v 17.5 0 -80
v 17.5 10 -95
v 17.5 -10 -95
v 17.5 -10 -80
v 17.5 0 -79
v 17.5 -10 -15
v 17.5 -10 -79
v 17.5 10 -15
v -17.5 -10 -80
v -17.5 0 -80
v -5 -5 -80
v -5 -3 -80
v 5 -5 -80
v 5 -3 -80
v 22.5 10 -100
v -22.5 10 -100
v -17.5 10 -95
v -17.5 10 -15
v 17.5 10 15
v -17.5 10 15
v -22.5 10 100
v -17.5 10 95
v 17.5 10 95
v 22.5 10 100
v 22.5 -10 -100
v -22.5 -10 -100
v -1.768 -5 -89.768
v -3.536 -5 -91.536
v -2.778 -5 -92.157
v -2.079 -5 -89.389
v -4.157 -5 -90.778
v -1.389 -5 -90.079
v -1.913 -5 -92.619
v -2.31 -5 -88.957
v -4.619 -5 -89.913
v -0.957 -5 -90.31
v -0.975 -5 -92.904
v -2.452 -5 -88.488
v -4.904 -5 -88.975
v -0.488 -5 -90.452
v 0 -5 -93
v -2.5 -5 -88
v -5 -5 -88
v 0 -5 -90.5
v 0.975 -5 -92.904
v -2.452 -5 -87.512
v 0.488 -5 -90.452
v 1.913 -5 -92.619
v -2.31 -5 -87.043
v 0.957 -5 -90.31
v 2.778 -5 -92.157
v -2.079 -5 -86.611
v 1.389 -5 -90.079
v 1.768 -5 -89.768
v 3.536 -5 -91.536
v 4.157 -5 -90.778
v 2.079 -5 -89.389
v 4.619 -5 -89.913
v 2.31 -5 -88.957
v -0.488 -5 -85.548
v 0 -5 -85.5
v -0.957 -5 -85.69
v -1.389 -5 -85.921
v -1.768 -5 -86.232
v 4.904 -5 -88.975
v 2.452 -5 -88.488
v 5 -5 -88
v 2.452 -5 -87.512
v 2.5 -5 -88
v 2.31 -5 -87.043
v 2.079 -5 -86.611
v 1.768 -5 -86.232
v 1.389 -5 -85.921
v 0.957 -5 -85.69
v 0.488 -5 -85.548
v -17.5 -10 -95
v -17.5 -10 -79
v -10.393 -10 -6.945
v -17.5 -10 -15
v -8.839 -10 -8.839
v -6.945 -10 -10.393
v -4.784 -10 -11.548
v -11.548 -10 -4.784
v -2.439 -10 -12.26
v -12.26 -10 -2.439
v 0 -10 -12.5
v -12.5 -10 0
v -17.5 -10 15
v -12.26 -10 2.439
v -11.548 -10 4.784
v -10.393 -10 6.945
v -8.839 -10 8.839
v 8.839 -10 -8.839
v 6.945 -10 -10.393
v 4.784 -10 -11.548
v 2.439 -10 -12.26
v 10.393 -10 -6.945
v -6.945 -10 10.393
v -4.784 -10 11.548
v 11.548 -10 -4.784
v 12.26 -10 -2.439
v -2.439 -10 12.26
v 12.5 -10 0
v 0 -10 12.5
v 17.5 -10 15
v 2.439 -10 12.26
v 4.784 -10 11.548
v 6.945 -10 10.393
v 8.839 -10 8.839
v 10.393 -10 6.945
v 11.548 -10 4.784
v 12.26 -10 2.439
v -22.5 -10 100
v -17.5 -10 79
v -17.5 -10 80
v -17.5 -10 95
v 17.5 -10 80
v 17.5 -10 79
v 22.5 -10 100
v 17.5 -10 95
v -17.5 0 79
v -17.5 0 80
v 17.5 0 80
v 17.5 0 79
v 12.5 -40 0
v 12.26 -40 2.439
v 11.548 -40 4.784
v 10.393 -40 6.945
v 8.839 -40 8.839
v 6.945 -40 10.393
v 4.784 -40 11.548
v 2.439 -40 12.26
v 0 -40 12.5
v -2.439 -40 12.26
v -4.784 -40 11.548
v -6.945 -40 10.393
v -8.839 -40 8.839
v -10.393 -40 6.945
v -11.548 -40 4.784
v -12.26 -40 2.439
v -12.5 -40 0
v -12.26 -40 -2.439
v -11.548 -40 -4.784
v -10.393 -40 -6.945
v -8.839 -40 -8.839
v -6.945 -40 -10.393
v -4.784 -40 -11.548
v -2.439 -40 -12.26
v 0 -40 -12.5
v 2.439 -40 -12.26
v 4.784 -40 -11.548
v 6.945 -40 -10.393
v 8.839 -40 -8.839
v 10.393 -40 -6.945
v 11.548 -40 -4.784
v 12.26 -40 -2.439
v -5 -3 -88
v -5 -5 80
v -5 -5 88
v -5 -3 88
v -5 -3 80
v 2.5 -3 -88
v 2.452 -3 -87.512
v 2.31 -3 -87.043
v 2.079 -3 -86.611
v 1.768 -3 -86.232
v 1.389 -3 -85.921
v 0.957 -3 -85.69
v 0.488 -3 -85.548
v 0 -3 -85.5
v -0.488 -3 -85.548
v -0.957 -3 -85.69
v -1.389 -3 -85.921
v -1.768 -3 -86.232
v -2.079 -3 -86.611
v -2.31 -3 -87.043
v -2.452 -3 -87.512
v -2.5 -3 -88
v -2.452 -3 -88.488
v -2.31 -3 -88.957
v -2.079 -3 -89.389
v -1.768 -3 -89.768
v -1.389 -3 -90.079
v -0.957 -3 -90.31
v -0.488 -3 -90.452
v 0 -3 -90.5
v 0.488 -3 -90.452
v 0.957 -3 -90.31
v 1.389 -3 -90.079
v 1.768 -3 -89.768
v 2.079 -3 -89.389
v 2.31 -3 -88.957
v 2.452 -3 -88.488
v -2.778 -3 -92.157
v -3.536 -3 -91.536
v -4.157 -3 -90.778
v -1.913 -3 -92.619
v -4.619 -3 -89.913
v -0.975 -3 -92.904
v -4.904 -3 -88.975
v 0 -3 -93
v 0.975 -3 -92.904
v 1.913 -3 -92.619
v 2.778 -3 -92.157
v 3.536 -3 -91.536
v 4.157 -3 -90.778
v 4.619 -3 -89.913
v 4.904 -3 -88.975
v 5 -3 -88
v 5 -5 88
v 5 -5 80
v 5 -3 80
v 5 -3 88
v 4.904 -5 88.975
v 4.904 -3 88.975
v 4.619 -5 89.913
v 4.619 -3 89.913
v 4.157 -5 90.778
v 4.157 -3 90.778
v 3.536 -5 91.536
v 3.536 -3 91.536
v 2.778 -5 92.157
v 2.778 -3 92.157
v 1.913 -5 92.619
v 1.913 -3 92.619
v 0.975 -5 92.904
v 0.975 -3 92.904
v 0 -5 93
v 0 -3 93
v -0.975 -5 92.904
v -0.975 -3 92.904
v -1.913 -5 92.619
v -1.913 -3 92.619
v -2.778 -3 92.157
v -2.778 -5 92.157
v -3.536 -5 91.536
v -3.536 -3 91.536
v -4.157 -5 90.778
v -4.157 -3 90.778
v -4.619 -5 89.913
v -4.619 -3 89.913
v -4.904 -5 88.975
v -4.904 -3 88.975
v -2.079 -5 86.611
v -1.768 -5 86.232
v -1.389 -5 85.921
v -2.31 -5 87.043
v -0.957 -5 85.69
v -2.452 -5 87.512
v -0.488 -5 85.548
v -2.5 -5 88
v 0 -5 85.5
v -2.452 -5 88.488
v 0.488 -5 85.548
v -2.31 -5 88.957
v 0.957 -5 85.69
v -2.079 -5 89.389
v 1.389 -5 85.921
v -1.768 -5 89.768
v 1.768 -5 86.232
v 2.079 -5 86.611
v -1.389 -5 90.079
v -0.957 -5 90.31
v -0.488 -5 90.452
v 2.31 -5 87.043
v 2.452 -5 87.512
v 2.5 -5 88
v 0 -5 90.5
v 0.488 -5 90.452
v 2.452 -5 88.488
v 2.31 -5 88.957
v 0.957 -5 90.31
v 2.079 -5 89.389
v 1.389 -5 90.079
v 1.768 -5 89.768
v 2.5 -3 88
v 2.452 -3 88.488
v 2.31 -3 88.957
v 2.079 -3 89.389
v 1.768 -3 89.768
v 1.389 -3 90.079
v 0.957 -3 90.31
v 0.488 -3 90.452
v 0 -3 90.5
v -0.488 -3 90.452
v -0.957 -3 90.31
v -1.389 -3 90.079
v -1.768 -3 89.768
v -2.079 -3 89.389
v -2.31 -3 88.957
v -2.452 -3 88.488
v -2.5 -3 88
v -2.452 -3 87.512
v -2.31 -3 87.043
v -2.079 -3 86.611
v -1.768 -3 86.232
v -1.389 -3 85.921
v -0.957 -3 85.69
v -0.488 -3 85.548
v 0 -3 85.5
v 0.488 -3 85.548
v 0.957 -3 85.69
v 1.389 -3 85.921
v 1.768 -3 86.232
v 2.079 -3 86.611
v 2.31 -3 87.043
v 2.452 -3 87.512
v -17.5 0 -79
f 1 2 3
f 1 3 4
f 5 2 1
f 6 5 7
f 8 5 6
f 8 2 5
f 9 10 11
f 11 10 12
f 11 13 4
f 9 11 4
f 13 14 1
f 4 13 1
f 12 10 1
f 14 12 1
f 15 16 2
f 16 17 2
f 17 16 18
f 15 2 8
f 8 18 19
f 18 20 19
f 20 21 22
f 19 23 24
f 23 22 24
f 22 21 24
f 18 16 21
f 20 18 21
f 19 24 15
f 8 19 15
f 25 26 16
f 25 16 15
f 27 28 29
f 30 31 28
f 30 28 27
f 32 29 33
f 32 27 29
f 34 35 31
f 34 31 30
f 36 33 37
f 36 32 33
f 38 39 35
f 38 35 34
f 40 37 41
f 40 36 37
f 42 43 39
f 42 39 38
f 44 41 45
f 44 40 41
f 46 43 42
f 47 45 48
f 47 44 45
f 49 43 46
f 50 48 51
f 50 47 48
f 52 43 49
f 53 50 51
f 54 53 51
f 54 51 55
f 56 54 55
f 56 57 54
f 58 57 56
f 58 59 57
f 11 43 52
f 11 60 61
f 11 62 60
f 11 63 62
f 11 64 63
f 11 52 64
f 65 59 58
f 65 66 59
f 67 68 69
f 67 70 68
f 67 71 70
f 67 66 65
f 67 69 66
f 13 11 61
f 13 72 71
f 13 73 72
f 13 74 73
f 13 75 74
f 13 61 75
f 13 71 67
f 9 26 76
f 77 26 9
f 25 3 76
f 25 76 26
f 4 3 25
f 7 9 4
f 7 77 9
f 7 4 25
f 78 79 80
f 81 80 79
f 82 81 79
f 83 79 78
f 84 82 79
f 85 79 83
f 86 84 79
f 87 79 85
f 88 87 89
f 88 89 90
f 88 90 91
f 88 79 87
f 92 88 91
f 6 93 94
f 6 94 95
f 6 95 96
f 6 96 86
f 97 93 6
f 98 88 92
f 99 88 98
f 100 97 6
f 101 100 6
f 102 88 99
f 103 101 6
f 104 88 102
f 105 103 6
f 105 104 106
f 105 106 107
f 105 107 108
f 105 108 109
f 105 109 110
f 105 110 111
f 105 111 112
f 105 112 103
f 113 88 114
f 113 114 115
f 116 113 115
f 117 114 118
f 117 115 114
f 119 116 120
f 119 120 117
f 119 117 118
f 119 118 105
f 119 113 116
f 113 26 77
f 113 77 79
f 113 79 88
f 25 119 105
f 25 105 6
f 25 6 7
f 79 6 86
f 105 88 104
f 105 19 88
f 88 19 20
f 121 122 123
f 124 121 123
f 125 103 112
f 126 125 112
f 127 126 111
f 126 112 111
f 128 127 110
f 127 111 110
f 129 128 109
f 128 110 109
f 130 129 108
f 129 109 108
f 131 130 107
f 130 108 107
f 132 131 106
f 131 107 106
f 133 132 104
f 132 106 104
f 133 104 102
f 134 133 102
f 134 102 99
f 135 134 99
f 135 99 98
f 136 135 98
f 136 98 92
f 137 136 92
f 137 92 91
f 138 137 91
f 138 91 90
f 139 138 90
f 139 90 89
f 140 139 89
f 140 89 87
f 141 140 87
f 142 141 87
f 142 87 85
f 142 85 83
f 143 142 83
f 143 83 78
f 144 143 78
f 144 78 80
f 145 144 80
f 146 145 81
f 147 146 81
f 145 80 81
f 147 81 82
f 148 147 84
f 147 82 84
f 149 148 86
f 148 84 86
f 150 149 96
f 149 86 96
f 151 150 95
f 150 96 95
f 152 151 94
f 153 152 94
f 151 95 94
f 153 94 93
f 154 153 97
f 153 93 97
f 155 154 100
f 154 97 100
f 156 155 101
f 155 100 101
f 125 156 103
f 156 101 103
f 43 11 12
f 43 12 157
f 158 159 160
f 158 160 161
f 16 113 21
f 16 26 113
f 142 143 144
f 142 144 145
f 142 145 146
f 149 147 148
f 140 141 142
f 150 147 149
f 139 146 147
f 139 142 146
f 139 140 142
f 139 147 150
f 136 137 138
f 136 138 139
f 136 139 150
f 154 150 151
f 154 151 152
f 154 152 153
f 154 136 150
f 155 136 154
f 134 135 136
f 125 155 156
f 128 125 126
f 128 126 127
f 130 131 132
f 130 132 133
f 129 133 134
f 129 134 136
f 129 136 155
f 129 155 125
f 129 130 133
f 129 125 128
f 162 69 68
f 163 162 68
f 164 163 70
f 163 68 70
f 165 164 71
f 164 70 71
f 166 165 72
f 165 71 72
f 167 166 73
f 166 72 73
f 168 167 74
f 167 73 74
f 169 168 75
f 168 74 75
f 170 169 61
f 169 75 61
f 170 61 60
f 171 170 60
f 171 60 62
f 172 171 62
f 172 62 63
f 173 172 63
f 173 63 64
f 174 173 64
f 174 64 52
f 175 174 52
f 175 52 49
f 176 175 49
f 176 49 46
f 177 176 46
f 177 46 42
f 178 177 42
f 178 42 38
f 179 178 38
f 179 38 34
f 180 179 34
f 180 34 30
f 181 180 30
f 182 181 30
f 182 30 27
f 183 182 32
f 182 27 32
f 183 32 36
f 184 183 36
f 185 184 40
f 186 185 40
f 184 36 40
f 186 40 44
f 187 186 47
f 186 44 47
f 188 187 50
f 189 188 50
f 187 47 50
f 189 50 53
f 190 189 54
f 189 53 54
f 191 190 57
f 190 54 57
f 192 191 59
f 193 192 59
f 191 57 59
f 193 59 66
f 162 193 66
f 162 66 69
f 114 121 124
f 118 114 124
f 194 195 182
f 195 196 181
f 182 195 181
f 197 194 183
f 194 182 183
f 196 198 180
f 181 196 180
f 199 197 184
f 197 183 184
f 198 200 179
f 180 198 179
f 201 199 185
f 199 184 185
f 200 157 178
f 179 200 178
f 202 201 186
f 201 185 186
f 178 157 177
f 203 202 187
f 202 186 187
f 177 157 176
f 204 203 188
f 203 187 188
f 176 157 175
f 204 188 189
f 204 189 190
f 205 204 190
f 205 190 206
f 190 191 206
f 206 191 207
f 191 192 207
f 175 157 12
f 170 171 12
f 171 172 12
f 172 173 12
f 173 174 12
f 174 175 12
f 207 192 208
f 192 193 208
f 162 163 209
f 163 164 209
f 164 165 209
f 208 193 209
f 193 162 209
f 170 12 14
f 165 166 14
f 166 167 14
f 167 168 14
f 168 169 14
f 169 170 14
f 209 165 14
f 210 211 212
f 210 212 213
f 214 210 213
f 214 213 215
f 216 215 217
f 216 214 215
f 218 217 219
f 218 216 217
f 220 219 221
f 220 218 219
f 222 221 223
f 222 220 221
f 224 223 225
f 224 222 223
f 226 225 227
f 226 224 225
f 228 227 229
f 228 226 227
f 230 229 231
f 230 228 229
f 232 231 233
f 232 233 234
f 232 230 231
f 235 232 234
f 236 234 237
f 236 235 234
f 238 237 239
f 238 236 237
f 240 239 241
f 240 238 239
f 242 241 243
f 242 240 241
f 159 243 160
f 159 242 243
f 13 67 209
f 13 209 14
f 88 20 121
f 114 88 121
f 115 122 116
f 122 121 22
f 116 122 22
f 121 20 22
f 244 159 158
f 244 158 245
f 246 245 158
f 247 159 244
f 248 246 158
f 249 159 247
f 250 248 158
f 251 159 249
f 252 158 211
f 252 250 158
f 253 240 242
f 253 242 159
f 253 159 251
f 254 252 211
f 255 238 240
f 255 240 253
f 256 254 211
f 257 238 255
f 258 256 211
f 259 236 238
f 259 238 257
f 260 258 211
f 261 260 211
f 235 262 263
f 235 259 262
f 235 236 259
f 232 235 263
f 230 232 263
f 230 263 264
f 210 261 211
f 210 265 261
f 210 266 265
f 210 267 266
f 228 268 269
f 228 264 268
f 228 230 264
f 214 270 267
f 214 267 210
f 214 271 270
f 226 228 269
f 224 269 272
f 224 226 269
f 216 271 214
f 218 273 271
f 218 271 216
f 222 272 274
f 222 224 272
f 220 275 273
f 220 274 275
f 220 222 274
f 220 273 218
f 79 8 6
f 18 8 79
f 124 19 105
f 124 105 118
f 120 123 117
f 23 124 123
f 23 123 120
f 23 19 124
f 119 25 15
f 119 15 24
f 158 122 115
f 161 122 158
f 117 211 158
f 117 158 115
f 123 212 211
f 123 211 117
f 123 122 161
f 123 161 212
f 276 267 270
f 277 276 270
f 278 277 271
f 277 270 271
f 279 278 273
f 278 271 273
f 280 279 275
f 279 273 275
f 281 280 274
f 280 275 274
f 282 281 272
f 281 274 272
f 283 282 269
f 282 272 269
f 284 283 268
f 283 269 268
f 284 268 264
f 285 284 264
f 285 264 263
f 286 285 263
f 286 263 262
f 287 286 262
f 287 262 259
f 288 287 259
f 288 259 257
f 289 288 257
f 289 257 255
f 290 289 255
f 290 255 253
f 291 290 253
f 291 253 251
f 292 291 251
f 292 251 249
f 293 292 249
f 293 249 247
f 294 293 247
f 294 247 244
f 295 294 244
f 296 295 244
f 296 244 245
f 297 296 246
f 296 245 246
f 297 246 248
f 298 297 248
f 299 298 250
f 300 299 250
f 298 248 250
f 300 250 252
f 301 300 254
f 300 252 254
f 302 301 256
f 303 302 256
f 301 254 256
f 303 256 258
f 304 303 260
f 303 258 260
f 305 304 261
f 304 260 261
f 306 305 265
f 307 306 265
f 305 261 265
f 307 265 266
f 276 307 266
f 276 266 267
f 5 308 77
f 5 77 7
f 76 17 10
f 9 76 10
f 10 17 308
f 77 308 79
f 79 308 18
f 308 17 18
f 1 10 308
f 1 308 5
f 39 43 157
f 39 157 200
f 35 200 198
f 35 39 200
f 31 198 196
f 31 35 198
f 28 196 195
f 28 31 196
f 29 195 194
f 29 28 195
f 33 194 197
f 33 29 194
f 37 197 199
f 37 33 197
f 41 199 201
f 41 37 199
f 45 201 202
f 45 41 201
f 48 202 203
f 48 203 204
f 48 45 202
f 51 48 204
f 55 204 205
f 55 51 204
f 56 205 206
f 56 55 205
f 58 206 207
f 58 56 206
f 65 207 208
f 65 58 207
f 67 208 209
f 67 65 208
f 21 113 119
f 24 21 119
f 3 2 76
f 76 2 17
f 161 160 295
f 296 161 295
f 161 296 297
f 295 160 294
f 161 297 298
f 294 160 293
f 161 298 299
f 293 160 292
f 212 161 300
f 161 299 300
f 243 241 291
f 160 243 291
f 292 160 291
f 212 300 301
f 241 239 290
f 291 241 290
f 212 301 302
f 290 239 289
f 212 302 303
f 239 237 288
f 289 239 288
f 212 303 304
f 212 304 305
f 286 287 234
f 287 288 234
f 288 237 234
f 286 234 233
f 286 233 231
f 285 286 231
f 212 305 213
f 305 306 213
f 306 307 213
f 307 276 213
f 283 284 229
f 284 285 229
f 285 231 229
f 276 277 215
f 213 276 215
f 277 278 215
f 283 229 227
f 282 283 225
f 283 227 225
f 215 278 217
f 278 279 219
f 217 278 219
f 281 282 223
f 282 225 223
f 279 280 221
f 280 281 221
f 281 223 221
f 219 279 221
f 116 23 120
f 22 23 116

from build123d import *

# Parameters (mm, degrees)
F0_R      = 12.5
F1_DEPTH  = 40
F3_W      = 45
F3_H      = 200
F4_DEPTH  = 20
F5_W      = 35
F5_H      = 80
F6_DEPTH  = 25
F9_W      = 45
F9_H      = 10
F10_DEPTH = 1
F11_W     = 45
F11_H     = 10
F12_DEPTH = 1
F15_DEPTH = 2
F17_R     = 2.5
F18_DEPTH = 20.001


with BuildPart() as f1:
    # F0 (on Front) → F1 (new body)
    with BuildSketch(Plane.XZ):
        Circle(F0_R)
    extrude(amount=F1_DEPTH)

    # F3 (on offset) → F4 (join)
    with BuildSketch(Plane.XZ.offset(10)):
        Rectangle(F3_W, F3_H)
    extrude(amount=-F4_DEPTH)

    # F5 (on face) → F6 (cut)
    with BuildSketch(Plane(origin=(0, 10, 0), x_dir=(-1, 0, 0), z_dir=(0, 1, 0))):
        with Locations((0, 55)):
            Rectangle(F5_W, F5_H)
        with Locations((0, -55)):
            Rectangle(F5_W, F5_H)
    extrude(amount=-F6_DEPTH, mode=Mode.SUBTRACT)

    # F9 (on offset) → F10 (join)
    with BuildSketch(Plane.XY.offset(80)):
        with Locations((0, -5)):
            Rectangle(F9_W, F9_H)
    extrude(amount=-F10_DEPTH)

    # F11 (on offset) → F12 (join)
    with BuildSketch(Plane.XY.offset(-80)):
        with Locations((0, -5)):
            Rectangle(F11_W, F11_H)
    extrude(amount=F12_DEPTH)


with BuildPart() as f15:
    # F14 (on offset) → F15 (new body)
    with BuildSketch(Plane.XZ.offset(5)):
        with BuildLine():
            Line((-5, 88), (-5, 80))
            Line((-5, 80), (5, 80))
            Line((5, 80), (5, 88))
            ThreePointArc((5, 88), (0, 93), (-5, 88))
        make_face()
        with BuildLine():
            Line((5, -80), (-5, -80))
            Line((-5, -80), (-5, -88))
            ThreePointArc((-5, -88), (0, -93), (5, -88))
            Line((5, -88), (5, -80))
        make_face()
    extrude(amount=-F15_DEPTH)


with BuildPart() as f1_1:
    add(f1.part)

    # F16: union F15
    add(f15.part)

    # F17 (on face) → F18 (cut, through all)
    with BuildSketch(Plane.XZ.offset(10)):
        with Locations((0, -88)):
            Circle(F17_R)
        with Locations((0, 88)):
            Circle(F17_R)
    extrude(amount=-F18_DEPTH, mode=Mode.SUBTRACT)


solid = f1_1.part
